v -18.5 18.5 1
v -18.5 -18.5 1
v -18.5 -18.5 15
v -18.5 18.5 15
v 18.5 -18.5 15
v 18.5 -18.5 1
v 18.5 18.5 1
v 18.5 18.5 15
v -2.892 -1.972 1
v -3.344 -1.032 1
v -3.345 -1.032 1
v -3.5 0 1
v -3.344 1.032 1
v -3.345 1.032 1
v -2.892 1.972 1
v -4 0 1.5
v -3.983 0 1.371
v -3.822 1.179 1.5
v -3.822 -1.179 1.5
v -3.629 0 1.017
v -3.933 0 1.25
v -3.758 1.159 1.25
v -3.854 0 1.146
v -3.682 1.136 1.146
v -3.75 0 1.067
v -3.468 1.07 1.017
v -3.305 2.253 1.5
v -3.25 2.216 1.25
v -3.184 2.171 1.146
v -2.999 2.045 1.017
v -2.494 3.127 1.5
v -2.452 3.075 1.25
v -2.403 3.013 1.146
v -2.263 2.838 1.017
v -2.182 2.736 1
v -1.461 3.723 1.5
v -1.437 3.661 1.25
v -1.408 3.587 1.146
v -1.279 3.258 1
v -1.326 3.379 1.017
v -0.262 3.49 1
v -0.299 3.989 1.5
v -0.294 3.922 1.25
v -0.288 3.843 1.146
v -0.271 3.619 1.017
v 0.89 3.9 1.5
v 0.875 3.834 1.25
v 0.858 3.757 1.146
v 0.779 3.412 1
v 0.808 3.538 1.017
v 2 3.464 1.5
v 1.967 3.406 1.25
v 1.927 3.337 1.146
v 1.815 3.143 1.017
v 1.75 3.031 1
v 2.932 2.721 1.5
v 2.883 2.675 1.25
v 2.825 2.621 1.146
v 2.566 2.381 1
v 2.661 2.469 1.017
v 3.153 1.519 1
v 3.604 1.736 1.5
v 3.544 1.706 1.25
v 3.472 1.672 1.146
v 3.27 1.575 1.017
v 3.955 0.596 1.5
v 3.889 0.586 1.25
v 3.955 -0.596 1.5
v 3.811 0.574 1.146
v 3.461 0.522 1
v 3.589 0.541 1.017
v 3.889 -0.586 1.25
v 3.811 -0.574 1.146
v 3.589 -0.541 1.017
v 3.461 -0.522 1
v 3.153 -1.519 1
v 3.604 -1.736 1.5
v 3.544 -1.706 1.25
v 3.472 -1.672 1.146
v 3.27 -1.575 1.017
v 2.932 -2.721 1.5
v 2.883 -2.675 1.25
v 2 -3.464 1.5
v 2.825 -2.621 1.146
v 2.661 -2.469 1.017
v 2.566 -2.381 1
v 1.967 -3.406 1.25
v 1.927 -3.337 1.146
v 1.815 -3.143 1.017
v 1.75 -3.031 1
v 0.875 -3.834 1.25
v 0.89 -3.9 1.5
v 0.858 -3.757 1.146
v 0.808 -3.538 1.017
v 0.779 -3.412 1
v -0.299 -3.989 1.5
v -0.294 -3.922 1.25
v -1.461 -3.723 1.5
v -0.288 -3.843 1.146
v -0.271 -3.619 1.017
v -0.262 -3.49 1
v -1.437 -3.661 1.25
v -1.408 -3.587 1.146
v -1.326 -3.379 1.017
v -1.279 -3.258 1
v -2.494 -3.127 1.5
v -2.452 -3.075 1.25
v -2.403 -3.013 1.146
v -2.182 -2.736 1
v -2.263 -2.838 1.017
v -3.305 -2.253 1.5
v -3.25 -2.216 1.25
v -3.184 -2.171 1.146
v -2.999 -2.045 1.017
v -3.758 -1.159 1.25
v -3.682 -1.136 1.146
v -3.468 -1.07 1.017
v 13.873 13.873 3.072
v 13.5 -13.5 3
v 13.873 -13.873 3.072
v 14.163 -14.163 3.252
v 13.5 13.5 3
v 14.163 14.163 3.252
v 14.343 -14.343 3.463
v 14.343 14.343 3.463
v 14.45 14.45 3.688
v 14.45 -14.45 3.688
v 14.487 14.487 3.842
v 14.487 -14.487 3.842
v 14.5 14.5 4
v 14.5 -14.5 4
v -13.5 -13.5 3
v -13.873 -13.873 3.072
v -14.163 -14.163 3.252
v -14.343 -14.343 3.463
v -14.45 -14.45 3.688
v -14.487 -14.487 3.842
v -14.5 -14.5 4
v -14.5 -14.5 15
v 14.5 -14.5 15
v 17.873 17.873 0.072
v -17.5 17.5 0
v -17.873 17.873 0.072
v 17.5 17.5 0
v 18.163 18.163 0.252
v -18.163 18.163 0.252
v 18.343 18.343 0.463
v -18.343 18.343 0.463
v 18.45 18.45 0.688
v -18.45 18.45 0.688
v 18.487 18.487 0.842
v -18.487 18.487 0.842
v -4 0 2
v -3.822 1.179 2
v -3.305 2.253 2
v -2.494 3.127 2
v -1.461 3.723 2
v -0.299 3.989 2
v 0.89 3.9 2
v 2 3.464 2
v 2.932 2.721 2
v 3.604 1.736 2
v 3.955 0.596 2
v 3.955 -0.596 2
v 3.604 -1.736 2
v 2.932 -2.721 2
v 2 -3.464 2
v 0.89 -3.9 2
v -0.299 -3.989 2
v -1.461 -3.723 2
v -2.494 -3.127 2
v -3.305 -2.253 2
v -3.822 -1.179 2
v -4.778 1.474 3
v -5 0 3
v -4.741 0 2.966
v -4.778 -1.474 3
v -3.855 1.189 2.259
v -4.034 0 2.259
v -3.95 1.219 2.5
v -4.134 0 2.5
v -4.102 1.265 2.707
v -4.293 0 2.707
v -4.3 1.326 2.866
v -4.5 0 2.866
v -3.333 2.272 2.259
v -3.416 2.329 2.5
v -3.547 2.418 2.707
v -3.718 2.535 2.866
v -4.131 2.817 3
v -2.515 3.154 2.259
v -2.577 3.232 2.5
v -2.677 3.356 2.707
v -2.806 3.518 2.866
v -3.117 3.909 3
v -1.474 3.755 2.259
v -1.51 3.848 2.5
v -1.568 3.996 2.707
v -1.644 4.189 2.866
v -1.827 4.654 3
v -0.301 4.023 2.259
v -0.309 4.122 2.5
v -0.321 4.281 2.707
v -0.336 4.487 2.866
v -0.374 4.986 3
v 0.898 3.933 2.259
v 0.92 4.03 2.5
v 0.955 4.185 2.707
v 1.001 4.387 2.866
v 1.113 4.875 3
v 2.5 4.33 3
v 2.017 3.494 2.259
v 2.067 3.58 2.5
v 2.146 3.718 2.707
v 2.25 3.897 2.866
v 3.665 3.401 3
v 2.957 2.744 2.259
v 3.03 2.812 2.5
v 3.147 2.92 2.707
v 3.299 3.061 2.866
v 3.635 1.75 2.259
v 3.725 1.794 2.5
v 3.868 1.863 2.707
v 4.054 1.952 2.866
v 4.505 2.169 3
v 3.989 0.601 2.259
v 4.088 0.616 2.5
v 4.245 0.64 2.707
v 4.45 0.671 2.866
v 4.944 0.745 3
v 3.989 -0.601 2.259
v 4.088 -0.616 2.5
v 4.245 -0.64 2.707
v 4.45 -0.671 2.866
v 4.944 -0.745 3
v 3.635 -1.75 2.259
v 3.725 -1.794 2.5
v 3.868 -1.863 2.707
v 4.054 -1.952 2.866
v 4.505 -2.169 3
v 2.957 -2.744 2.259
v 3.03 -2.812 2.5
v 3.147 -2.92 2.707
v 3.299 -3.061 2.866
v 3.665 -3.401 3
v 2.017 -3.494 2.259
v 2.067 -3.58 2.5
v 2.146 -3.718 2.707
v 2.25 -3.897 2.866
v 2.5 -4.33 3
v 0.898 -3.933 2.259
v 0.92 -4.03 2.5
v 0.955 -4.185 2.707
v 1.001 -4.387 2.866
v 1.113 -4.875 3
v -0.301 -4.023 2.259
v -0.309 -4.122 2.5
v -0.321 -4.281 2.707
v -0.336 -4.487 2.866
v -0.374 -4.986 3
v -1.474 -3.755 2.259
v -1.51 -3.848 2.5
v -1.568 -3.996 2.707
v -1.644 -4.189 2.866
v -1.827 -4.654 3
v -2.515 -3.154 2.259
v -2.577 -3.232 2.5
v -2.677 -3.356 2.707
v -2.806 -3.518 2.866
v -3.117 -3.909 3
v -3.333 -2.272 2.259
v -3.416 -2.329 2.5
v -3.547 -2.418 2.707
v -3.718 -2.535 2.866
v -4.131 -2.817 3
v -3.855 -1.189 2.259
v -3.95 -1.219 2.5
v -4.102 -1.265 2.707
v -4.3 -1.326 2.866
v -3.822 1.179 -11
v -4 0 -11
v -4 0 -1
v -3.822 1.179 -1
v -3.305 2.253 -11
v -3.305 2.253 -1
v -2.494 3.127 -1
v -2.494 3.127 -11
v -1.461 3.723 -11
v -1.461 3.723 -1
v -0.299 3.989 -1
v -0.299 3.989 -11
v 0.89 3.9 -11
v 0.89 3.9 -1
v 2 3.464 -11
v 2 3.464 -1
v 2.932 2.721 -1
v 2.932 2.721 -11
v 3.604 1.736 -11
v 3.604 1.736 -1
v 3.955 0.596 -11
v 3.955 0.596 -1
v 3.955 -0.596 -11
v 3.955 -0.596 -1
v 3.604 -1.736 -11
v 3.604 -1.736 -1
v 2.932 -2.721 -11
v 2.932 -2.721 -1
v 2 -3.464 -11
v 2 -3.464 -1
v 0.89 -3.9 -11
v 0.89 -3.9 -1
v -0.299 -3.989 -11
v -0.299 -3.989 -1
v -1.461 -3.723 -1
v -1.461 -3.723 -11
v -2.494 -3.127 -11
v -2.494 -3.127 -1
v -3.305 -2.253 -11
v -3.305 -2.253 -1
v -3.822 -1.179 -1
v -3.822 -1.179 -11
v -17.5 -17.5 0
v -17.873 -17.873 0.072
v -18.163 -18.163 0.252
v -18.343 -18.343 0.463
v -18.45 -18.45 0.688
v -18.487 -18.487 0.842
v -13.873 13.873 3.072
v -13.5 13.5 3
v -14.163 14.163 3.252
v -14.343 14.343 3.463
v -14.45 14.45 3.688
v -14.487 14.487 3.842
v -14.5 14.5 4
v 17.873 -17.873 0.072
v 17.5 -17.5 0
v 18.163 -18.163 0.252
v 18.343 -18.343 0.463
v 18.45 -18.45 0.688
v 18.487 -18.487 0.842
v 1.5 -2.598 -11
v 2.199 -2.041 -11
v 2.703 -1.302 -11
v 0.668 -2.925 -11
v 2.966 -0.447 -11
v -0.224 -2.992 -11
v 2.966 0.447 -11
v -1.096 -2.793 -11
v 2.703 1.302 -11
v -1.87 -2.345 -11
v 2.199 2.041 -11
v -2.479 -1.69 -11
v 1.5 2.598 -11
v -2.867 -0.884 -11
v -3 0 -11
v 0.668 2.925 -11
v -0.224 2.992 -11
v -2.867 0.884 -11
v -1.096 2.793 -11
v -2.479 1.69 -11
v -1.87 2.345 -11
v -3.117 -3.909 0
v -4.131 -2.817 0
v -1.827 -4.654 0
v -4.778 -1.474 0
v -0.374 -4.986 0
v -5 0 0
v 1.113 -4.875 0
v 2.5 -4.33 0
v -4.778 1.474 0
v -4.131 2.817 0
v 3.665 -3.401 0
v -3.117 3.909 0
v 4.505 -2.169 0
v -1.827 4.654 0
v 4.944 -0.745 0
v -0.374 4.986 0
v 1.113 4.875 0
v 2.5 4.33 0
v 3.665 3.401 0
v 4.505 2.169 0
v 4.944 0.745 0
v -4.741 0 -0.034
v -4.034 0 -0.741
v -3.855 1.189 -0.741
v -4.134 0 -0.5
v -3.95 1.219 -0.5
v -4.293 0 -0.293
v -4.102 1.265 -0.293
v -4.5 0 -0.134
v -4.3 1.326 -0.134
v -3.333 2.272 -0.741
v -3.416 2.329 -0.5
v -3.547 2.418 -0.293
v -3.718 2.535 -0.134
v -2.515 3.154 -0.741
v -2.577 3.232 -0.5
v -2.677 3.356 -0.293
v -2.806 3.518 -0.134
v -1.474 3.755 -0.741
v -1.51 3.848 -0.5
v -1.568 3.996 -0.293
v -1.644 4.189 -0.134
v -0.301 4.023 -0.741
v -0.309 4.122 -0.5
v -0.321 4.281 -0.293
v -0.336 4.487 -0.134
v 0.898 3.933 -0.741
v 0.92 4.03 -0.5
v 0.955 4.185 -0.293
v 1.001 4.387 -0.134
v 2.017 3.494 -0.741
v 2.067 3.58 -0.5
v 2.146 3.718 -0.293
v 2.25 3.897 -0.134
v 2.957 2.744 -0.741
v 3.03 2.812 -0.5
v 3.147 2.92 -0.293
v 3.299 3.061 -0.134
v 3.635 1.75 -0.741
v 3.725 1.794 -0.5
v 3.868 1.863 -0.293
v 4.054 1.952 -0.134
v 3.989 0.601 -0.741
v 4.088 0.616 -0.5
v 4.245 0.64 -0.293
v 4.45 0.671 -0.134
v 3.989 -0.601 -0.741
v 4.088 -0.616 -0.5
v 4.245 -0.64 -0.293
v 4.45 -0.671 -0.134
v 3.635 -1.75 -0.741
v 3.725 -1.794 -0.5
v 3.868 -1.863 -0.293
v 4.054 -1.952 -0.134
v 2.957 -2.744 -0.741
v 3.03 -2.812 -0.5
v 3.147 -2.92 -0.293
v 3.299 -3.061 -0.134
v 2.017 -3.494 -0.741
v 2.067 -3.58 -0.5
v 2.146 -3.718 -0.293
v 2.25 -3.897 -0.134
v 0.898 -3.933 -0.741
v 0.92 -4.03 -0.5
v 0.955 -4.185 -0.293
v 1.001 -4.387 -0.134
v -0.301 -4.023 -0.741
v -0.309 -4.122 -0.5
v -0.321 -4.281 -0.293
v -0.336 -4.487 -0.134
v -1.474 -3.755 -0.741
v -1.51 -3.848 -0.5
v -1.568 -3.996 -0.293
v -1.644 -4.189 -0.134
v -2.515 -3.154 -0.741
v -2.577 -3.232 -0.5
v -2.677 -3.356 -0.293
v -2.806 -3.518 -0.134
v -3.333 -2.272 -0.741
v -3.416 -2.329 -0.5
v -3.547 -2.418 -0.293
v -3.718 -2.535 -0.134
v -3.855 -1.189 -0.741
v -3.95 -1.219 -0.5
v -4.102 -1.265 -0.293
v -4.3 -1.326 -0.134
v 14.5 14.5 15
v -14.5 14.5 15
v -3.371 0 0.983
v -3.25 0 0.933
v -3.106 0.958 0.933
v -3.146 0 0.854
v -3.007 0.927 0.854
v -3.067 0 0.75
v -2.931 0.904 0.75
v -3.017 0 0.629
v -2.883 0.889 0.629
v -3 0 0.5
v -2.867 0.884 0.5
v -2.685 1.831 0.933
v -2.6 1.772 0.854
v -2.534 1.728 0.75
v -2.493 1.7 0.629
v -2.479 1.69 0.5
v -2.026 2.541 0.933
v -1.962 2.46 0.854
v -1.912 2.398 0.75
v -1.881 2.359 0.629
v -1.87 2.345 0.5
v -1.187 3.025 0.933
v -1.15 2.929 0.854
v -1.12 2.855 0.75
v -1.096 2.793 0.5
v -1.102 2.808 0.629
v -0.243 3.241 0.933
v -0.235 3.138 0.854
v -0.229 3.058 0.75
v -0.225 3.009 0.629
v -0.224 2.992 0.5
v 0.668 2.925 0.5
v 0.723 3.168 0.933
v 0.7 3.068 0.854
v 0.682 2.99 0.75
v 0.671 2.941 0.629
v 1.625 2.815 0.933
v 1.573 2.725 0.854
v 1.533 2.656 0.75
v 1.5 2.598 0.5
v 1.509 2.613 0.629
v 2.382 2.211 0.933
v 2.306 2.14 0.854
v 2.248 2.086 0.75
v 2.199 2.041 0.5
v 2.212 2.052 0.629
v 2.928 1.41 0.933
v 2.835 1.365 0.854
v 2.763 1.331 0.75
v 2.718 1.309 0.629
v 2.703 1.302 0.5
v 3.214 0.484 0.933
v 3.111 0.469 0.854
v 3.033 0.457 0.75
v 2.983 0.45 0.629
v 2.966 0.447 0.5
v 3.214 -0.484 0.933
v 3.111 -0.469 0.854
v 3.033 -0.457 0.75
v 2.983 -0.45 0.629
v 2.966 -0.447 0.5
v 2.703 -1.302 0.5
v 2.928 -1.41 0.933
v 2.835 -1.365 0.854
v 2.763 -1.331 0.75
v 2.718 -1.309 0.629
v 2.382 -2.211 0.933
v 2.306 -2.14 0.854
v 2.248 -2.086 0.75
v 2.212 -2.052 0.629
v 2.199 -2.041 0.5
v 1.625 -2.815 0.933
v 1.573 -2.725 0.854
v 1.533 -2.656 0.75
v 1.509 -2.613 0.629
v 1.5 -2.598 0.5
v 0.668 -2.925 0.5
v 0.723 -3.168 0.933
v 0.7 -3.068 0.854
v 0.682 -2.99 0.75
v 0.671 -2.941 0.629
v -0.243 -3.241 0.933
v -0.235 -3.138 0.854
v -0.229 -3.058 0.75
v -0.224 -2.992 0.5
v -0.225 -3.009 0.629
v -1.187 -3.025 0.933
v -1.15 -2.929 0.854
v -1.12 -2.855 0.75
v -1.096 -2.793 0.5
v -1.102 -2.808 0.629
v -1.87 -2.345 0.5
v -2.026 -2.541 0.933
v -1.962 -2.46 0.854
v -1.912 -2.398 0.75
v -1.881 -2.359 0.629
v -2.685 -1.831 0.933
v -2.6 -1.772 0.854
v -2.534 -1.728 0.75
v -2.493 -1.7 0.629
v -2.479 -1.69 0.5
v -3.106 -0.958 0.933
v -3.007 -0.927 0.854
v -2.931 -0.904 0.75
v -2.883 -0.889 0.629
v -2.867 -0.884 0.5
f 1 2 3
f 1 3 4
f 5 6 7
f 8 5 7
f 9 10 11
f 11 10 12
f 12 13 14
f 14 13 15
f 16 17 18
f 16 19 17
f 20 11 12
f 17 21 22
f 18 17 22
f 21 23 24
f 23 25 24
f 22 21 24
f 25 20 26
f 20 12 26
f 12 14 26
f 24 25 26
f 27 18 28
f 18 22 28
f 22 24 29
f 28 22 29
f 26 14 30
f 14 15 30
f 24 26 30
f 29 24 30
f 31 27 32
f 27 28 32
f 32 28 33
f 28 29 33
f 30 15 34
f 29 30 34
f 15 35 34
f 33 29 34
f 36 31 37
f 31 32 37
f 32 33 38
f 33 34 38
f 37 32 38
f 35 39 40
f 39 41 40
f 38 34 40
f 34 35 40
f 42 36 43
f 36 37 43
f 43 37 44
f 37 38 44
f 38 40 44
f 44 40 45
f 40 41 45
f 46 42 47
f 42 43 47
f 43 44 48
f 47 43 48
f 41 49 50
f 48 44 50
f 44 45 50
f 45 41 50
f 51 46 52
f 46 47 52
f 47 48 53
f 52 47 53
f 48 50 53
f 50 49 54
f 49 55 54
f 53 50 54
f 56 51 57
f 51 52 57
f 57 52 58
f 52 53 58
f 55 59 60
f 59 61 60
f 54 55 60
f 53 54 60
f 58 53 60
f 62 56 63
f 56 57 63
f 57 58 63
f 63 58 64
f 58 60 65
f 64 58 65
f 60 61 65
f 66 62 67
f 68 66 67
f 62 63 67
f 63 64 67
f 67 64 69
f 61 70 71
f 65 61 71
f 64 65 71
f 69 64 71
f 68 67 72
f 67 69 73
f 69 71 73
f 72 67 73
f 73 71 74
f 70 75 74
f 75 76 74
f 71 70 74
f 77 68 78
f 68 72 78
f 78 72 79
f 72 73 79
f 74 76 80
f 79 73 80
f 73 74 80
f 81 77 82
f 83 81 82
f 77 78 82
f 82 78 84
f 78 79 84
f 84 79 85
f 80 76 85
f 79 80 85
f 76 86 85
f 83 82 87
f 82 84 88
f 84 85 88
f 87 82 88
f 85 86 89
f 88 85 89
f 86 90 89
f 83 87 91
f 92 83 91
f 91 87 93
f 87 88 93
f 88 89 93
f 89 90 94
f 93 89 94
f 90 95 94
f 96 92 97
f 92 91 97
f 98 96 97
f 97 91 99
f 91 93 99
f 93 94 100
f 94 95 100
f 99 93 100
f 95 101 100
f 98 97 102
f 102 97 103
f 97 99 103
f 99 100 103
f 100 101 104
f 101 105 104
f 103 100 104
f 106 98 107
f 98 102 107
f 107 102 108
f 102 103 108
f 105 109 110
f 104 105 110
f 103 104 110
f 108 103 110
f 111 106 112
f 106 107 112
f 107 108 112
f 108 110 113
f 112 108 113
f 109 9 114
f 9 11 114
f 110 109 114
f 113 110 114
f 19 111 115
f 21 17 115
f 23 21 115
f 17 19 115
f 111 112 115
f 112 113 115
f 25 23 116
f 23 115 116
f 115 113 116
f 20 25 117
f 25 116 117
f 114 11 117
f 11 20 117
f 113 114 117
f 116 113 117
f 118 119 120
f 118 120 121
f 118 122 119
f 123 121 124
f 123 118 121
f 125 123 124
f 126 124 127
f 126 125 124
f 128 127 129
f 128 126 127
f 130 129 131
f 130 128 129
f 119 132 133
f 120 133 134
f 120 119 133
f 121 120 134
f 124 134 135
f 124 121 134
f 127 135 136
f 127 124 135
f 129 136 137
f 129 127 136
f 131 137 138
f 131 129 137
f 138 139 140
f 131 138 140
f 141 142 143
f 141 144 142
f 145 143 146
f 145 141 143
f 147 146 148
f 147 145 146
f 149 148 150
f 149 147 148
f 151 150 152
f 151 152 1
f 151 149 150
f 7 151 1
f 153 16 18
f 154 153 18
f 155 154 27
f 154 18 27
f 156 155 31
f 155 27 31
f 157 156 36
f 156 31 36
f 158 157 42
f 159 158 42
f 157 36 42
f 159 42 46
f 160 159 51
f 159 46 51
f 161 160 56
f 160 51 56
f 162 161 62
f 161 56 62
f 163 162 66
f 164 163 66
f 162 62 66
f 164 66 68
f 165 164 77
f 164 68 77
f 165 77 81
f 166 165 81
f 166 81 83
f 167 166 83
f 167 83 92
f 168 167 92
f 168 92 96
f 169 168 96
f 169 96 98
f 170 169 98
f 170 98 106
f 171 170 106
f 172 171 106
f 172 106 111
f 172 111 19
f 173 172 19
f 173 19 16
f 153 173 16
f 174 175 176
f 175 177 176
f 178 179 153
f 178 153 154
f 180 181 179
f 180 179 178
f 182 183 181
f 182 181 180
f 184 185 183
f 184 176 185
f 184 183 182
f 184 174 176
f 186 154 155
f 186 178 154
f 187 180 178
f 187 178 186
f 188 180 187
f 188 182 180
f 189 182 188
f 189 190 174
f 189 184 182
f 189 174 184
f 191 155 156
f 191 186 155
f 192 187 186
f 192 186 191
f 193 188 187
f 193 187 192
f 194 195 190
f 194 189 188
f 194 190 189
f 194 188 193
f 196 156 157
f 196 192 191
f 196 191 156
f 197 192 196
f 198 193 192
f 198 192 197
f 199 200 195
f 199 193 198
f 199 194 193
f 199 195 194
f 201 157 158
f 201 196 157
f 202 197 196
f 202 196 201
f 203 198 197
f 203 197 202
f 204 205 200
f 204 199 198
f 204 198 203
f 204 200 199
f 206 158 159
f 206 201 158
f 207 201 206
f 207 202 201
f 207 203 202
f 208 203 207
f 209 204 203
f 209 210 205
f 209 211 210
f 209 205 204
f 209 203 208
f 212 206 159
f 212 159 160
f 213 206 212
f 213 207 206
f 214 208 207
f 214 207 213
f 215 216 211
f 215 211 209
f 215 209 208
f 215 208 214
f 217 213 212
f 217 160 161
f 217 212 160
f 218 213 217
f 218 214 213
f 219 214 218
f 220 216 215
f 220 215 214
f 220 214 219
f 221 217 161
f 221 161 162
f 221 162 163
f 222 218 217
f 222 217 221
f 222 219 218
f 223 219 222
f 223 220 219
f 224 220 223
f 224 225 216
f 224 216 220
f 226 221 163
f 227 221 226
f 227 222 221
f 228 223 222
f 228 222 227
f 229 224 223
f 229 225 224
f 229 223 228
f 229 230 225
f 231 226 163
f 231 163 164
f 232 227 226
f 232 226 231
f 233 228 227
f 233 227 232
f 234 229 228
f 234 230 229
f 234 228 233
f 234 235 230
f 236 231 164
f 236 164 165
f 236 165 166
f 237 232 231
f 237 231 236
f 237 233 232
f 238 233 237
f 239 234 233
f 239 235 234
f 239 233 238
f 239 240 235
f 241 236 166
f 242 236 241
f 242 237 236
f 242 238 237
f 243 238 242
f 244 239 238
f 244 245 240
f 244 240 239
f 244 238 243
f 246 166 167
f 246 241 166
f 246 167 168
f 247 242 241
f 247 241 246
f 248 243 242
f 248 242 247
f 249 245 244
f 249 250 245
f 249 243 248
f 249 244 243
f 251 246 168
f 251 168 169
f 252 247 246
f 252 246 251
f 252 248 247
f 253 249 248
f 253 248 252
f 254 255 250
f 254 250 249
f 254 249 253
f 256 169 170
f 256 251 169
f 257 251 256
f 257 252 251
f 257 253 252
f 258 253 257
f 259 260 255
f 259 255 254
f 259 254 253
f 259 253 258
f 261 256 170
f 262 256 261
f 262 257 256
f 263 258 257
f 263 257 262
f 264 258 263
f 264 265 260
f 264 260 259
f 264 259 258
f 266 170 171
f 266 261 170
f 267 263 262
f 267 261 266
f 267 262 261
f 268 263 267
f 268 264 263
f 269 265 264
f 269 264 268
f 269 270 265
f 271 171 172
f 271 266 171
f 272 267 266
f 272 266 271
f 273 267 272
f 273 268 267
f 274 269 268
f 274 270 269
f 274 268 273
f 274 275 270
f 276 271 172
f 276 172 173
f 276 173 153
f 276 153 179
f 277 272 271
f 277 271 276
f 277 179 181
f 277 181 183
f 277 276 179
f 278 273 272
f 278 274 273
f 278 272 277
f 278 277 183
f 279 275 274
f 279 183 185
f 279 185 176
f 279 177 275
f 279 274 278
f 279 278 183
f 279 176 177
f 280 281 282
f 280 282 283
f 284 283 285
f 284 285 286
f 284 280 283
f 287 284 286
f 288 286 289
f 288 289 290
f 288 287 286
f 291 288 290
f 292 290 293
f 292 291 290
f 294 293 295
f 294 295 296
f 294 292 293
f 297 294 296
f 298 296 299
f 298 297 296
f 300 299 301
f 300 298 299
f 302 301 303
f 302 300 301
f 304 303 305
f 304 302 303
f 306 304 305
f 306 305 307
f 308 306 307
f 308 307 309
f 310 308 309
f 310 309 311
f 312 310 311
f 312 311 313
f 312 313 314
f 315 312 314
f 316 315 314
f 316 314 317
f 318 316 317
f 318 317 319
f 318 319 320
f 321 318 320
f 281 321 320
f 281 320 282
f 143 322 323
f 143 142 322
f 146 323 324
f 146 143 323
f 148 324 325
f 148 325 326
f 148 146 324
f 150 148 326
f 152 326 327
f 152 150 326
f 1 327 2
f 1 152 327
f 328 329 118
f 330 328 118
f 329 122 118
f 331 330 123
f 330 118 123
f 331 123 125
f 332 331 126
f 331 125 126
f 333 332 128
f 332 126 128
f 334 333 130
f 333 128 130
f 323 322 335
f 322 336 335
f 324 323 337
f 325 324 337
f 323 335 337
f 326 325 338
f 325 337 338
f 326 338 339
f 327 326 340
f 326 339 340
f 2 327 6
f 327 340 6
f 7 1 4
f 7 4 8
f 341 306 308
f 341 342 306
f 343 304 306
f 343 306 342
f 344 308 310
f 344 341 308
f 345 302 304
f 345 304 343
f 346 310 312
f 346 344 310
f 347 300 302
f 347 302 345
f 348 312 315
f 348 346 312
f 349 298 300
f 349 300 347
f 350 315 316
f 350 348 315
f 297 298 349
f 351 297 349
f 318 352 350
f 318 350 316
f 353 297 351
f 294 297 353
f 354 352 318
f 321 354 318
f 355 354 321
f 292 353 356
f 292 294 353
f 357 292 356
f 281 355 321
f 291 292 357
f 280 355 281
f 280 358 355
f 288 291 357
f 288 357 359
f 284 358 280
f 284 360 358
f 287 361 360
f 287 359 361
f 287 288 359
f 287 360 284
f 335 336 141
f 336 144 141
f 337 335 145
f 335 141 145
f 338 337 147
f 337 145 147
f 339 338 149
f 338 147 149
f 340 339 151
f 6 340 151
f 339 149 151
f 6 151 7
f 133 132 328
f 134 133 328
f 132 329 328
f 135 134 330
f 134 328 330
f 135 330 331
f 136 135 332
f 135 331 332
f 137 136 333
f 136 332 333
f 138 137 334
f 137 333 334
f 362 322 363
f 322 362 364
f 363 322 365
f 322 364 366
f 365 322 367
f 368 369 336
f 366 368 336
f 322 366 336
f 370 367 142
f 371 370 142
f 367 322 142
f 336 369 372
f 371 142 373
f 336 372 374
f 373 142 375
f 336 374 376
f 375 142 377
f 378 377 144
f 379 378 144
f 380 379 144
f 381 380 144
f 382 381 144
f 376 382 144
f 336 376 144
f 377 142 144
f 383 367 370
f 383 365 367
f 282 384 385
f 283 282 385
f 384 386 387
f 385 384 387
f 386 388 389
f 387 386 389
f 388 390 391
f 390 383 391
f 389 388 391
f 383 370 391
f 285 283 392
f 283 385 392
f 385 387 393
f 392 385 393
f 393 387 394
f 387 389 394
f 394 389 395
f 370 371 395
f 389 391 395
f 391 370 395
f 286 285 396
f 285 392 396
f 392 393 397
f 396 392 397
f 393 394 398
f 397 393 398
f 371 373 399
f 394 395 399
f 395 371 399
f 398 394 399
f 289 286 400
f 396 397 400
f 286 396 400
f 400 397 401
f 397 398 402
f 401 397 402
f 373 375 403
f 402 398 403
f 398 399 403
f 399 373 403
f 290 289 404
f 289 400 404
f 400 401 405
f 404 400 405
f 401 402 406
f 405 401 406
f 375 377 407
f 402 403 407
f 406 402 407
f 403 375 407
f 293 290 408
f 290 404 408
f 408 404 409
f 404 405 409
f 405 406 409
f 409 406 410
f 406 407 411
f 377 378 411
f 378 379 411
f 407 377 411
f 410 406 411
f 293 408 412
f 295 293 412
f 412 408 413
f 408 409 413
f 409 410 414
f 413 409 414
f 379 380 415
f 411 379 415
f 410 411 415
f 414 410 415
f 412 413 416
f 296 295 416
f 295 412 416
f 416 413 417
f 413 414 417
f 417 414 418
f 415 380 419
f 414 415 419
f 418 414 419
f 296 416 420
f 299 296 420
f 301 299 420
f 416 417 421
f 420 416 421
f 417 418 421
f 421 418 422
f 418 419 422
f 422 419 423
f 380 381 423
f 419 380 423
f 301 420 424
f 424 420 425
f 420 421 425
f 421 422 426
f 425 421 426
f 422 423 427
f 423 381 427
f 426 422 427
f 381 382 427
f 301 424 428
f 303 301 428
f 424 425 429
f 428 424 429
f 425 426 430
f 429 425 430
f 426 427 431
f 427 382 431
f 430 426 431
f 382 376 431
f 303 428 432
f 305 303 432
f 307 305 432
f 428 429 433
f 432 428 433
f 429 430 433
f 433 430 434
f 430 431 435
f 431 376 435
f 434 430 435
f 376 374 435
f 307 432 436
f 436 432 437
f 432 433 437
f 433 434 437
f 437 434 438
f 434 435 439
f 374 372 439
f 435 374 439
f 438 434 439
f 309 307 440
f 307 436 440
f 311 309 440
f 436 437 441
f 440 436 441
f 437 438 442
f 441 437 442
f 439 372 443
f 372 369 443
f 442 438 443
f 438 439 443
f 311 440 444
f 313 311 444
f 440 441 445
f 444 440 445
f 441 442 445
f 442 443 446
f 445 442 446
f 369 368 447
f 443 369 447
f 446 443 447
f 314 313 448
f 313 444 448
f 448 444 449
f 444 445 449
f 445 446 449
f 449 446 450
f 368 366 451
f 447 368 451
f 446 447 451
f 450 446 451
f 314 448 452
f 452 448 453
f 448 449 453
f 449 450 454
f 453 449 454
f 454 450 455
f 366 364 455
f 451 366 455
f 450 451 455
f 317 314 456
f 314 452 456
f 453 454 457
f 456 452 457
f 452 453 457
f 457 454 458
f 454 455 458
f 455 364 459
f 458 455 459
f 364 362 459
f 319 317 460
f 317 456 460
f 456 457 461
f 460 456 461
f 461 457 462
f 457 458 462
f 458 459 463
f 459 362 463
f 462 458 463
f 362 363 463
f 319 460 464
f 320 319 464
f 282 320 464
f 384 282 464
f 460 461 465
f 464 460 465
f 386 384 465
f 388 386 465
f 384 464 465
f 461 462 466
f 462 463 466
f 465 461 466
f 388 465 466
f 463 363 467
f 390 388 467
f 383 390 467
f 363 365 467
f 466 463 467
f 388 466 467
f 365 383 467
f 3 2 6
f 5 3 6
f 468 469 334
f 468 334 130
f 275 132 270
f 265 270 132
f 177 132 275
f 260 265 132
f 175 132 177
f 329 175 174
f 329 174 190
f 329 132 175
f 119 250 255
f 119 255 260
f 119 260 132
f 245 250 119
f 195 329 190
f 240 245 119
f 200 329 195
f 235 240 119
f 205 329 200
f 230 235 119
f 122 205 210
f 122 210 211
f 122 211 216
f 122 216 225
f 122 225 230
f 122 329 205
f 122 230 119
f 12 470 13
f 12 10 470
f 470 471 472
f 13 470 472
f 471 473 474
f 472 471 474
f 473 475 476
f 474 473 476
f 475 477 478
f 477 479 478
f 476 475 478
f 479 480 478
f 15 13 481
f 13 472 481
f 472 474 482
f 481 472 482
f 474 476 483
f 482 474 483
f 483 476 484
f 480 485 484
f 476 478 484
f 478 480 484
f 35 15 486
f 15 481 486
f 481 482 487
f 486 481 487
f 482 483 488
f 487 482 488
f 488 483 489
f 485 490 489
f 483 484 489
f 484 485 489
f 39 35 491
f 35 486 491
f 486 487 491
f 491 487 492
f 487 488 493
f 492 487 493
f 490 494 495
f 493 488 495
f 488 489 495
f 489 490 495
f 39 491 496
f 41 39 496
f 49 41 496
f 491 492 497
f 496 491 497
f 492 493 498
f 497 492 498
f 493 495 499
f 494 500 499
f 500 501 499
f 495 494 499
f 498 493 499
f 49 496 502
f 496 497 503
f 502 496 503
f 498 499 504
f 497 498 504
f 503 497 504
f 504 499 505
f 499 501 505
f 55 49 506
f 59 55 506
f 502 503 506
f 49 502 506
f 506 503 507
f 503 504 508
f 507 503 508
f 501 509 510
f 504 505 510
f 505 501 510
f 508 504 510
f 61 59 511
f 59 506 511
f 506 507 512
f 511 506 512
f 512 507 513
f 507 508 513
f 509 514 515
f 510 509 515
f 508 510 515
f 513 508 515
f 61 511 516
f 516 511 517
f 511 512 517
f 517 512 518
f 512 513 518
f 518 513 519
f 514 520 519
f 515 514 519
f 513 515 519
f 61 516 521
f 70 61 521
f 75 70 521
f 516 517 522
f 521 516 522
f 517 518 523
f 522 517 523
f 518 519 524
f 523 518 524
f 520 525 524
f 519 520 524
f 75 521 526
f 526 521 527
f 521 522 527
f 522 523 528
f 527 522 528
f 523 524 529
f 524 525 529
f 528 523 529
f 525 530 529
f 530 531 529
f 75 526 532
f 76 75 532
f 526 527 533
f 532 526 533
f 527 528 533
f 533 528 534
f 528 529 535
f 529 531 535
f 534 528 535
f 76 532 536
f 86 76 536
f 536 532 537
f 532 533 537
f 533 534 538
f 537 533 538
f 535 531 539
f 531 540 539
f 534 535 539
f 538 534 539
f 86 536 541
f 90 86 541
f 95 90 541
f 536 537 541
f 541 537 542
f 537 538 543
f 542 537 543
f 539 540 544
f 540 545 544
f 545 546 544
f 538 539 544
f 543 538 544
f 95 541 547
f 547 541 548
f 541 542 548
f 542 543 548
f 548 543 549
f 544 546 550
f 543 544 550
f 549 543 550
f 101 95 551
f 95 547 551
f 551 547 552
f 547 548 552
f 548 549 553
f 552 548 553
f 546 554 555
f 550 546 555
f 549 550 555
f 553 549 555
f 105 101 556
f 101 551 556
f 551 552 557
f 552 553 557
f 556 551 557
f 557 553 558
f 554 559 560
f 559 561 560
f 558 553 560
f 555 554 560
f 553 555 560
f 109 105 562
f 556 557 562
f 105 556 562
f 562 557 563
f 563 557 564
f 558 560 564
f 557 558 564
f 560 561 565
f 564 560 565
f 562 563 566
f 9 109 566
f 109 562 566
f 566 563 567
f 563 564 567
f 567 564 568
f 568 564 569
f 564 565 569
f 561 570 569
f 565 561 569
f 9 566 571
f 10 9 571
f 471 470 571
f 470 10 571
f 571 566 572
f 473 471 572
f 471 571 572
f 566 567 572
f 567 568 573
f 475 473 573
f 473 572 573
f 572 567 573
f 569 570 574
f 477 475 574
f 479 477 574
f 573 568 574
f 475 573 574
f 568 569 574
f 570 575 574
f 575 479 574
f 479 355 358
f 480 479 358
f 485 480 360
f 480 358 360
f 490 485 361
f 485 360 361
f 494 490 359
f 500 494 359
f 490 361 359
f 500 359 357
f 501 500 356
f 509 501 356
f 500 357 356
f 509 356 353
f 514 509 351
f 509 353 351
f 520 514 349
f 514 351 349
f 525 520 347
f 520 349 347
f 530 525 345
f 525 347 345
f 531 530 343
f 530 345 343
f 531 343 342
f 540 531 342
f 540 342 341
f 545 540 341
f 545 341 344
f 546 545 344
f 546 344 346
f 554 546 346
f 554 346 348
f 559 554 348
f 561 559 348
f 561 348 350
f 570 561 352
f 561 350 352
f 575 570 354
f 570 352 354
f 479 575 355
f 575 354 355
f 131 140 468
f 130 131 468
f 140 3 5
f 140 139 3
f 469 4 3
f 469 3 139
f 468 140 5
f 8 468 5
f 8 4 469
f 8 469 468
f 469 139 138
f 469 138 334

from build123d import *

# Parameters (mm, degrees)
SKETCH2_W           = 37
SKETCH2_H           = 37
BOSS_EXTRUDE1_DEPTH = 15
SKETCH3_W           = 29
SKETCH3_H           = 29
CUT_EXTRUDE1_DEPTH  = 12
SKETCH4_R           = 4
CUT_EXTRUDE2_DEPTH  = 12
BOSS_EXTRUDE3_START = 12
SKETCH5_R           = 4
BOSS_EXTRUDE3_DEPTH = 12
SKETCH6_R           = 3
CUT_EXTRUDE3_DEPTH  = 12
FILLET3_R           = 1
FILLET4_R           = 1
FILLET6_R           = 0.5


with BuildPart() as part:
    # Sketch2 → Boss-Extrude1 (new body)
    with BuildSketch(Plane.XY):
        Rectangle(SKETCH2_W, SKETCH2_H)
    extrude(amount=BOSS_EXTRUDE1_DEPTH)

    # Sketch3 → Cut-Extrude1 (cut)
    with BuildSketch(Plane.XY.offset(15)):
        Rectangle(SKETCH3_W, SKETCH3_H)
    extrude(amount=-CUT_EXTRUDE1_DEPTH, mode=Mode.SUBTRACT)

    # Sketch4 → Cut-Extrude2 (cut)
    with BuildSketch(Plane(origin=(0, 0, 0), x_dir=(-1, 0, 0), z_dir=(0, 0, -1))):
        Circle(SKETCH4_R)
    extrude(amount=-CUT_EXTRUDE2_DEPTH, mode=Mode.SUBTRACT)

    # Sketch5 → Boss-Extrude3 (add)
    with BuildSketch(Plane(origin=(0, 0, 1), x_dir=(-1, 0, 0), z_dir=(0, 0, -1)).offset(BOSS_EXTRUDE3_START)):
        Circle(SKETCH5_R)
    extrude(amount=-BOSS_EXTRUDE3_DEPTH)

    # Sketch6 → Cut-Extrude3 (cut)
    with BuildSketch(Plane(origin=(0, 0, -11), x_dir=(-1, 0, 0), z_dir=(0, 0, -1))):
        Circle(SKETCH6_R)
    extrude(amount=-CUT_EXTRUDE3_DEPTH, mode=Mode.SUBTRACT)

    # Fillet3
    fillet3_edges = [part.edges().sort_by_distance(p)[0] for p in [
        (4, 0, 0),
        (0, 18.5, 0),
        (18.5, 0, 0),
        (0, -18.5, 0),
        (-18.5, 0, 0),
    ]]
    fillet(fillet3_edges, radius=FILLET3_R)

    # Fillet4
    fillet4_edges = [part.edges().sort_by_distance(p)[0] for p in [
        (-14.5, 0, 3),
        (0, 14.5, 3),
        (14.5, 0, 3),
        (0, -14.5, 3),
        (4, 0, 3),
    ]]
    fillet(fillet4_edges, radius=FILLET4_R)

    # Fillet6
    fillet6_edges = [part.edges().sort_by_distance(p)[0] for p in [
        (4, 0, 1),
        (3, 0, 1),
    ]]
    fillet(fillet6_edges, radius=FILLET6_R - 0.0001)  # a hair under: the kernel refuses the full size


solid = part.part
